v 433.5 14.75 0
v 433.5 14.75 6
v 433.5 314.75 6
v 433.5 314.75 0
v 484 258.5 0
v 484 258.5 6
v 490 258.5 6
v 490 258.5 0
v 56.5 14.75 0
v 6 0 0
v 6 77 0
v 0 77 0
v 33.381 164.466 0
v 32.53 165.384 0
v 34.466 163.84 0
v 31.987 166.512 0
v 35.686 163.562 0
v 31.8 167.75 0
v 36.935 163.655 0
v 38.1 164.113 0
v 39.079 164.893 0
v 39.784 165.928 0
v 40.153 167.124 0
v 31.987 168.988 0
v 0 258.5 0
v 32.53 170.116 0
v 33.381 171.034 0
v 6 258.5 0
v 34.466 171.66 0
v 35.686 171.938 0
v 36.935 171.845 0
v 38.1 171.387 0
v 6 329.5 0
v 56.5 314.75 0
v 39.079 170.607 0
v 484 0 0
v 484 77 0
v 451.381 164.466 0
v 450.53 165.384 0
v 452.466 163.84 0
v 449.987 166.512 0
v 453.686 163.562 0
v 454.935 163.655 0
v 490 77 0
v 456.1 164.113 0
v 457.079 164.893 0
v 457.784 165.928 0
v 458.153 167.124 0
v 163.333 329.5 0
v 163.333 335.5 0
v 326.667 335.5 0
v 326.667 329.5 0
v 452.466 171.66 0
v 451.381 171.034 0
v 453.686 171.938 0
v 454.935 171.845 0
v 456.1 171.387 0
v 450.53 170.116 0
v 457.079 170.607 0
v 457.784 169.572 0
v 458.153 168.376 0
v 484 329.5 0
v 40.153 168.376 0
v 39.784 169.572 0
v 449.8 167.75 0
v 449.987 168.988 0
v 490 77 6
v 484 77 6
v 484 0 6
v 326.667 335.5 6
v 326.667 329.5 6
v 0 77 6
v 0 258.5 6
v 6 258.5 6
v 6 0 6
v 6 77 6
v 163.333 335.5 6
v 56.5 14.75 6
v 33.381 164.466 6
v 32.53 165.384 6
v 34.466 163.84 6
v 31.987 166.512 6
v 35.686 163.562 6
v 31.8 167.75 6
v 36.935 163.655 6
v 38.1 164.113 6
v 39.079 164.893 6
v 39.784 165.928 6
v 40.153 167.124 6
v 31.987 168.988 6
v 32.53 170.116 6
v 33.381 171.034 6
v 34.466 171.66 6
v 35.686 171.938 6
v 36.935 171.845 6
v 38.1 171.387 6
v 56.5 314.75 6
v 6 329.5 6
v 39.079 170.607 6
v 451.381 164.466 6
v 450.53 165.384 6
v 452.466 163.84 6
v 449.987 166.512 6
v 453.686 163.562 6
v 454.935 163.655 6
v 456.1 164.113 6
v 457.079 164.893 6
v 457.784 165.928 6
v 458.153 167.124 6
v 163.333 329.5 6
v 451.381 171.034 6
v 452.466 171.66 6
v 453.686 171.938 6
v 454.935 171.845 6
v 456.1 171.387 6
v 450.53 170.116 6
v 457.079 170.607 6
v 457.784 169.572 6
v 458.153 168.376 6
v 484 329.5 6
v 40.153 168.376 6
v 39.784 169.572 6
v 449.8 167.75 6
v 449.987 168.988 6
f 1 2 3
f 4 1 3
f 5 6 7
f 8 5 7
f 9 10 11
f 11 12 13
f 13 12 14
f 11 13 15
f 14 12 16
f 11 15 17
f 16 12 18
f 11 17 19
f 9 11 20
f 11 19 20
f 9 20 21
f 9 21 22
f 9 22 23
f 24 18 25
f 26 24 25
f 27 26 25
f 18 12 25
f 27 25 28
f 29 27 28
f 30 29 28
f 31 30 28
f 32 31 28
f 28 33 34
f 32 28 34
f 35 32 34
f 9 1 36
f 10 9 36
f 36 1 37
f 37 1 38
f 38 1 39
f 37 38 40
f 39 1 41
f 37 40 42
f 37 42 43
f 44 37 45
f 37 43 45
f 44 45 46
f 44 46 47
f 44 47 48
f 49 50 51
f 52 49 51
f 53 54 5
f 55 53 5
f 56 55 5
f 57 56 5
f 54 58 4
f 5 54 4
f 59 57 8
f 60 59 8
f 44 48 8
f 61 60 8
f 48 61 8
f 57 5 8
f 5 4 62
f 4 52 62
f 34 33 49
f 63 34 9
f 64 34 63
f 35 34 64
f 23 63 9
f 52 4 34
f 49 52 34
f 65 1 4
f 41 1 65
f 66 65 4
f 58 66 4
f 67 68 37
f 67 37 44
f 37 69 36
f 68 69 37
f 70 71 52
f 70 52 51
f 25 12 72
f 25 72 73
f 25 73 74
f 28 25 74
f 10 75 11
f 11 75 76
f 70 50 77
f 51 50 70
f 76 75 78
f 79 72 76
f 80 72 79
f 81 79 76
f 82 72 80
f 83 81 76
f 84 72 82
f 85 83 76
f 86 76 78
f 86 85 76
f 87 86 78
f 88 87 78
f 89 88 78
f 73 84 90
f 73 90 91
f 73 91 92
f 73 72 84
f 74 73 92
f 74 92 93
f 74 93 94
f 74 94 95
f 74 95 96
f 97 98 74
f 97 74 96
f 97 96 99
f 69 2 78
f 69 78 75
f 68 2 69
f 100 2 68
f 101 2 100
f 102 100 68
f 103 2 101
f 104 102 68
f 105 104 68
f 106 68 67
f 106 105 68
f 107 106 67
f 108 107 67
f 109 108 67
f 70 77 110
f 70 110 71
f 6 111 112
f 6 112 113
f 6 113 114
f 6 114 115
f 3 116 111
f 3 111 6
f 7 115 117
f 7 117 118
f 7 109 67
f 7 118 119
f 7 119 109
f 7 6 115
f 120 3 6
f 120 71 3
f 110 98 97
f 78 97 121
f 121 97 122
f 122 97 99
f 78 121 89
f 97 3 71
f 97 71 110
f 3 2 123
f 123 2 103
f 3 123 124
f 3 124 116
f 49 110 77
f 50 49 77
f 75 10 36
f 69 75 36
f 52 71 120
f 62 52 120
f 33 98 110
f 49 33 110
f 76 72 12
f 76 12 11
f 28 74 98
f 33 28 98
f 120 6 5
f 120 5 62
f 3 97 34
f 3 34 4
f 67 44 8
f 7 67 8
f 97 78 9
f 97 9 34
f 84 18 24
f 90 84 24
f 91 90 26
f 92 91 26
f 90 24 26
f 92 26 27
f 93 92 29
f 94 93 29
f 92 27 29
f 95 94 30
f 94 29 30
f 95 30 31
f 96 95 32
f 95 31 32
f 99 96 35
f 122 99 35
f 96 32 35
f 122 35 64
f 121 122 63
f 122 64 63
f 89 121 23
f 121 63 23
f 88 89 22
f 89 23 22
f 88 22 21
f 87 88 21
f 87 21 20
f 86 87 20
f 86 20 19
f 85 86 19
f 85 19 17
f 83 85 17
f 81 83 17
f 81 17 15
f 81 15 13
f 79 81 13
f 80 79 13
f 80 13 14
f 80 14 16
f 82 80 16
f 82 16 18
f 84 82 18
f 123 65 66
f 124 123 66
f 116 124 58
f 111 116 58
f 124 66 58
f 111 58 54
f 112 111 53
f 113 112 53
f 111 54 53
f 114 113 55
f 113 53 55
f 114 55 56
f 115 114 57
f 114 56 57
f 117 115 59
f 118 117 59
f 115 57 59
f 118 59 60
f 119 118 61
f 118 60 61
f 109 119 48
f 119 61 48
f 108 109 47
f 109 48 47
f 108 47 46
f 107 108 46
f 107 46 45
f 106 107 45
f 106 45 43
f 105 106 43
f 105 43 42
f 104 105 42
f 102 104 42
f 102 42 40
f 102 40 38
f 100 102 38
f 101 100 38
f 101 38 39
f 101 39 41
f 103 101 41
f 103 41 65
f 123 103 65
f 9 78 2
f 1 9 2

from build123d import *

# Parameters (mm, degrees)
SKETCH1_W            = 490
SKETCH1_H            = 335.5
BOSS_EXTRUDE1_DEPTH  = 6
SKETCH5_W            = 6
SKETCH5_H            = 77
CUT_EXTRUDE2_DEPTH   = 594.882353669
SKETCH3_W            = 377
SKETCH3_H            = 300
CUT_EXTRUDE3_DEPTH   = 594.882353669
SKETCH6_W            = 157.333333333
SKETCH6_H            = 6
CUT_EXTRUDE4_DEPTH   = 594.882353669
M8_CLEARANCE_SLOT1_D = 8.4


with BuildPart() as part:
    # Sketch1 → Boss-Extrude1 (new body)
    with BuildSketch(Plane.XY):
        with Locations((245, 167.75)):
            Rectangle(SKETCH1_W, SKETCH1_H)
    extrude(amount=BOSS_EXTRUDE1_DEPTH)

    # Sketch5 → Cut-Extrude2 (cut, through all)
    with BuildSketch(Plane.XY.offset(6)):
        with Locations((3, 297)):
            Rectangle(SKETCH5_W, SKETCH5_H)
        with Locations((3, 38.5)):
            Rectangle(SKETCH5_W, SKETCH5_H)
        with Locations((487, 297)):
            Rectangle(SKETCH5_W, SKETCH5_H)
        with Locations((487, 38.5)):
            Rectangle(SKETCH5_W, SKETCH5_H)
    extrude(amount=-CUT_EXTRUDE2_DEPTH, mode=Mode.SUBTRACT)

    # Sketch3 → Cut-Extrude3 (cut, through all)
    with BuildSketch(Plane.XY.offset(6)):
        with Locations((245, 164.75)):
            Rectangle(SKETCH3_W, SKETCH3_H)
    extrude(amount=-CUT_EXTRUDE3_DEPTH, mode=Mode.SUBTRACT)

    # Sketch6 → Cut-Extrude4 (cut, through all)
    with BuildSketch(Plane.XY.offset(6)):
        with Locations((405.333333334, 332.5)):
            Rectangle(SKETCH6_W, SKETCH6_H)
        with Locations((84.666666667, 332.5)):
            Rectangle(SKETCH6_W, SKETCH6_H)
    extrude(amount=-CUT_EXTRUDE4_DEPTH, mode=Mode.SUBTRACT)

    # M8 Clearance Slot1 (through all)
    with Locations(Plane.XY.offset(6)):
        with Locations((36, 167.75), (454, 167.75)):
            Hole(M8_CLEARANCE_SLOT1_D / 2)


solid = part.part
